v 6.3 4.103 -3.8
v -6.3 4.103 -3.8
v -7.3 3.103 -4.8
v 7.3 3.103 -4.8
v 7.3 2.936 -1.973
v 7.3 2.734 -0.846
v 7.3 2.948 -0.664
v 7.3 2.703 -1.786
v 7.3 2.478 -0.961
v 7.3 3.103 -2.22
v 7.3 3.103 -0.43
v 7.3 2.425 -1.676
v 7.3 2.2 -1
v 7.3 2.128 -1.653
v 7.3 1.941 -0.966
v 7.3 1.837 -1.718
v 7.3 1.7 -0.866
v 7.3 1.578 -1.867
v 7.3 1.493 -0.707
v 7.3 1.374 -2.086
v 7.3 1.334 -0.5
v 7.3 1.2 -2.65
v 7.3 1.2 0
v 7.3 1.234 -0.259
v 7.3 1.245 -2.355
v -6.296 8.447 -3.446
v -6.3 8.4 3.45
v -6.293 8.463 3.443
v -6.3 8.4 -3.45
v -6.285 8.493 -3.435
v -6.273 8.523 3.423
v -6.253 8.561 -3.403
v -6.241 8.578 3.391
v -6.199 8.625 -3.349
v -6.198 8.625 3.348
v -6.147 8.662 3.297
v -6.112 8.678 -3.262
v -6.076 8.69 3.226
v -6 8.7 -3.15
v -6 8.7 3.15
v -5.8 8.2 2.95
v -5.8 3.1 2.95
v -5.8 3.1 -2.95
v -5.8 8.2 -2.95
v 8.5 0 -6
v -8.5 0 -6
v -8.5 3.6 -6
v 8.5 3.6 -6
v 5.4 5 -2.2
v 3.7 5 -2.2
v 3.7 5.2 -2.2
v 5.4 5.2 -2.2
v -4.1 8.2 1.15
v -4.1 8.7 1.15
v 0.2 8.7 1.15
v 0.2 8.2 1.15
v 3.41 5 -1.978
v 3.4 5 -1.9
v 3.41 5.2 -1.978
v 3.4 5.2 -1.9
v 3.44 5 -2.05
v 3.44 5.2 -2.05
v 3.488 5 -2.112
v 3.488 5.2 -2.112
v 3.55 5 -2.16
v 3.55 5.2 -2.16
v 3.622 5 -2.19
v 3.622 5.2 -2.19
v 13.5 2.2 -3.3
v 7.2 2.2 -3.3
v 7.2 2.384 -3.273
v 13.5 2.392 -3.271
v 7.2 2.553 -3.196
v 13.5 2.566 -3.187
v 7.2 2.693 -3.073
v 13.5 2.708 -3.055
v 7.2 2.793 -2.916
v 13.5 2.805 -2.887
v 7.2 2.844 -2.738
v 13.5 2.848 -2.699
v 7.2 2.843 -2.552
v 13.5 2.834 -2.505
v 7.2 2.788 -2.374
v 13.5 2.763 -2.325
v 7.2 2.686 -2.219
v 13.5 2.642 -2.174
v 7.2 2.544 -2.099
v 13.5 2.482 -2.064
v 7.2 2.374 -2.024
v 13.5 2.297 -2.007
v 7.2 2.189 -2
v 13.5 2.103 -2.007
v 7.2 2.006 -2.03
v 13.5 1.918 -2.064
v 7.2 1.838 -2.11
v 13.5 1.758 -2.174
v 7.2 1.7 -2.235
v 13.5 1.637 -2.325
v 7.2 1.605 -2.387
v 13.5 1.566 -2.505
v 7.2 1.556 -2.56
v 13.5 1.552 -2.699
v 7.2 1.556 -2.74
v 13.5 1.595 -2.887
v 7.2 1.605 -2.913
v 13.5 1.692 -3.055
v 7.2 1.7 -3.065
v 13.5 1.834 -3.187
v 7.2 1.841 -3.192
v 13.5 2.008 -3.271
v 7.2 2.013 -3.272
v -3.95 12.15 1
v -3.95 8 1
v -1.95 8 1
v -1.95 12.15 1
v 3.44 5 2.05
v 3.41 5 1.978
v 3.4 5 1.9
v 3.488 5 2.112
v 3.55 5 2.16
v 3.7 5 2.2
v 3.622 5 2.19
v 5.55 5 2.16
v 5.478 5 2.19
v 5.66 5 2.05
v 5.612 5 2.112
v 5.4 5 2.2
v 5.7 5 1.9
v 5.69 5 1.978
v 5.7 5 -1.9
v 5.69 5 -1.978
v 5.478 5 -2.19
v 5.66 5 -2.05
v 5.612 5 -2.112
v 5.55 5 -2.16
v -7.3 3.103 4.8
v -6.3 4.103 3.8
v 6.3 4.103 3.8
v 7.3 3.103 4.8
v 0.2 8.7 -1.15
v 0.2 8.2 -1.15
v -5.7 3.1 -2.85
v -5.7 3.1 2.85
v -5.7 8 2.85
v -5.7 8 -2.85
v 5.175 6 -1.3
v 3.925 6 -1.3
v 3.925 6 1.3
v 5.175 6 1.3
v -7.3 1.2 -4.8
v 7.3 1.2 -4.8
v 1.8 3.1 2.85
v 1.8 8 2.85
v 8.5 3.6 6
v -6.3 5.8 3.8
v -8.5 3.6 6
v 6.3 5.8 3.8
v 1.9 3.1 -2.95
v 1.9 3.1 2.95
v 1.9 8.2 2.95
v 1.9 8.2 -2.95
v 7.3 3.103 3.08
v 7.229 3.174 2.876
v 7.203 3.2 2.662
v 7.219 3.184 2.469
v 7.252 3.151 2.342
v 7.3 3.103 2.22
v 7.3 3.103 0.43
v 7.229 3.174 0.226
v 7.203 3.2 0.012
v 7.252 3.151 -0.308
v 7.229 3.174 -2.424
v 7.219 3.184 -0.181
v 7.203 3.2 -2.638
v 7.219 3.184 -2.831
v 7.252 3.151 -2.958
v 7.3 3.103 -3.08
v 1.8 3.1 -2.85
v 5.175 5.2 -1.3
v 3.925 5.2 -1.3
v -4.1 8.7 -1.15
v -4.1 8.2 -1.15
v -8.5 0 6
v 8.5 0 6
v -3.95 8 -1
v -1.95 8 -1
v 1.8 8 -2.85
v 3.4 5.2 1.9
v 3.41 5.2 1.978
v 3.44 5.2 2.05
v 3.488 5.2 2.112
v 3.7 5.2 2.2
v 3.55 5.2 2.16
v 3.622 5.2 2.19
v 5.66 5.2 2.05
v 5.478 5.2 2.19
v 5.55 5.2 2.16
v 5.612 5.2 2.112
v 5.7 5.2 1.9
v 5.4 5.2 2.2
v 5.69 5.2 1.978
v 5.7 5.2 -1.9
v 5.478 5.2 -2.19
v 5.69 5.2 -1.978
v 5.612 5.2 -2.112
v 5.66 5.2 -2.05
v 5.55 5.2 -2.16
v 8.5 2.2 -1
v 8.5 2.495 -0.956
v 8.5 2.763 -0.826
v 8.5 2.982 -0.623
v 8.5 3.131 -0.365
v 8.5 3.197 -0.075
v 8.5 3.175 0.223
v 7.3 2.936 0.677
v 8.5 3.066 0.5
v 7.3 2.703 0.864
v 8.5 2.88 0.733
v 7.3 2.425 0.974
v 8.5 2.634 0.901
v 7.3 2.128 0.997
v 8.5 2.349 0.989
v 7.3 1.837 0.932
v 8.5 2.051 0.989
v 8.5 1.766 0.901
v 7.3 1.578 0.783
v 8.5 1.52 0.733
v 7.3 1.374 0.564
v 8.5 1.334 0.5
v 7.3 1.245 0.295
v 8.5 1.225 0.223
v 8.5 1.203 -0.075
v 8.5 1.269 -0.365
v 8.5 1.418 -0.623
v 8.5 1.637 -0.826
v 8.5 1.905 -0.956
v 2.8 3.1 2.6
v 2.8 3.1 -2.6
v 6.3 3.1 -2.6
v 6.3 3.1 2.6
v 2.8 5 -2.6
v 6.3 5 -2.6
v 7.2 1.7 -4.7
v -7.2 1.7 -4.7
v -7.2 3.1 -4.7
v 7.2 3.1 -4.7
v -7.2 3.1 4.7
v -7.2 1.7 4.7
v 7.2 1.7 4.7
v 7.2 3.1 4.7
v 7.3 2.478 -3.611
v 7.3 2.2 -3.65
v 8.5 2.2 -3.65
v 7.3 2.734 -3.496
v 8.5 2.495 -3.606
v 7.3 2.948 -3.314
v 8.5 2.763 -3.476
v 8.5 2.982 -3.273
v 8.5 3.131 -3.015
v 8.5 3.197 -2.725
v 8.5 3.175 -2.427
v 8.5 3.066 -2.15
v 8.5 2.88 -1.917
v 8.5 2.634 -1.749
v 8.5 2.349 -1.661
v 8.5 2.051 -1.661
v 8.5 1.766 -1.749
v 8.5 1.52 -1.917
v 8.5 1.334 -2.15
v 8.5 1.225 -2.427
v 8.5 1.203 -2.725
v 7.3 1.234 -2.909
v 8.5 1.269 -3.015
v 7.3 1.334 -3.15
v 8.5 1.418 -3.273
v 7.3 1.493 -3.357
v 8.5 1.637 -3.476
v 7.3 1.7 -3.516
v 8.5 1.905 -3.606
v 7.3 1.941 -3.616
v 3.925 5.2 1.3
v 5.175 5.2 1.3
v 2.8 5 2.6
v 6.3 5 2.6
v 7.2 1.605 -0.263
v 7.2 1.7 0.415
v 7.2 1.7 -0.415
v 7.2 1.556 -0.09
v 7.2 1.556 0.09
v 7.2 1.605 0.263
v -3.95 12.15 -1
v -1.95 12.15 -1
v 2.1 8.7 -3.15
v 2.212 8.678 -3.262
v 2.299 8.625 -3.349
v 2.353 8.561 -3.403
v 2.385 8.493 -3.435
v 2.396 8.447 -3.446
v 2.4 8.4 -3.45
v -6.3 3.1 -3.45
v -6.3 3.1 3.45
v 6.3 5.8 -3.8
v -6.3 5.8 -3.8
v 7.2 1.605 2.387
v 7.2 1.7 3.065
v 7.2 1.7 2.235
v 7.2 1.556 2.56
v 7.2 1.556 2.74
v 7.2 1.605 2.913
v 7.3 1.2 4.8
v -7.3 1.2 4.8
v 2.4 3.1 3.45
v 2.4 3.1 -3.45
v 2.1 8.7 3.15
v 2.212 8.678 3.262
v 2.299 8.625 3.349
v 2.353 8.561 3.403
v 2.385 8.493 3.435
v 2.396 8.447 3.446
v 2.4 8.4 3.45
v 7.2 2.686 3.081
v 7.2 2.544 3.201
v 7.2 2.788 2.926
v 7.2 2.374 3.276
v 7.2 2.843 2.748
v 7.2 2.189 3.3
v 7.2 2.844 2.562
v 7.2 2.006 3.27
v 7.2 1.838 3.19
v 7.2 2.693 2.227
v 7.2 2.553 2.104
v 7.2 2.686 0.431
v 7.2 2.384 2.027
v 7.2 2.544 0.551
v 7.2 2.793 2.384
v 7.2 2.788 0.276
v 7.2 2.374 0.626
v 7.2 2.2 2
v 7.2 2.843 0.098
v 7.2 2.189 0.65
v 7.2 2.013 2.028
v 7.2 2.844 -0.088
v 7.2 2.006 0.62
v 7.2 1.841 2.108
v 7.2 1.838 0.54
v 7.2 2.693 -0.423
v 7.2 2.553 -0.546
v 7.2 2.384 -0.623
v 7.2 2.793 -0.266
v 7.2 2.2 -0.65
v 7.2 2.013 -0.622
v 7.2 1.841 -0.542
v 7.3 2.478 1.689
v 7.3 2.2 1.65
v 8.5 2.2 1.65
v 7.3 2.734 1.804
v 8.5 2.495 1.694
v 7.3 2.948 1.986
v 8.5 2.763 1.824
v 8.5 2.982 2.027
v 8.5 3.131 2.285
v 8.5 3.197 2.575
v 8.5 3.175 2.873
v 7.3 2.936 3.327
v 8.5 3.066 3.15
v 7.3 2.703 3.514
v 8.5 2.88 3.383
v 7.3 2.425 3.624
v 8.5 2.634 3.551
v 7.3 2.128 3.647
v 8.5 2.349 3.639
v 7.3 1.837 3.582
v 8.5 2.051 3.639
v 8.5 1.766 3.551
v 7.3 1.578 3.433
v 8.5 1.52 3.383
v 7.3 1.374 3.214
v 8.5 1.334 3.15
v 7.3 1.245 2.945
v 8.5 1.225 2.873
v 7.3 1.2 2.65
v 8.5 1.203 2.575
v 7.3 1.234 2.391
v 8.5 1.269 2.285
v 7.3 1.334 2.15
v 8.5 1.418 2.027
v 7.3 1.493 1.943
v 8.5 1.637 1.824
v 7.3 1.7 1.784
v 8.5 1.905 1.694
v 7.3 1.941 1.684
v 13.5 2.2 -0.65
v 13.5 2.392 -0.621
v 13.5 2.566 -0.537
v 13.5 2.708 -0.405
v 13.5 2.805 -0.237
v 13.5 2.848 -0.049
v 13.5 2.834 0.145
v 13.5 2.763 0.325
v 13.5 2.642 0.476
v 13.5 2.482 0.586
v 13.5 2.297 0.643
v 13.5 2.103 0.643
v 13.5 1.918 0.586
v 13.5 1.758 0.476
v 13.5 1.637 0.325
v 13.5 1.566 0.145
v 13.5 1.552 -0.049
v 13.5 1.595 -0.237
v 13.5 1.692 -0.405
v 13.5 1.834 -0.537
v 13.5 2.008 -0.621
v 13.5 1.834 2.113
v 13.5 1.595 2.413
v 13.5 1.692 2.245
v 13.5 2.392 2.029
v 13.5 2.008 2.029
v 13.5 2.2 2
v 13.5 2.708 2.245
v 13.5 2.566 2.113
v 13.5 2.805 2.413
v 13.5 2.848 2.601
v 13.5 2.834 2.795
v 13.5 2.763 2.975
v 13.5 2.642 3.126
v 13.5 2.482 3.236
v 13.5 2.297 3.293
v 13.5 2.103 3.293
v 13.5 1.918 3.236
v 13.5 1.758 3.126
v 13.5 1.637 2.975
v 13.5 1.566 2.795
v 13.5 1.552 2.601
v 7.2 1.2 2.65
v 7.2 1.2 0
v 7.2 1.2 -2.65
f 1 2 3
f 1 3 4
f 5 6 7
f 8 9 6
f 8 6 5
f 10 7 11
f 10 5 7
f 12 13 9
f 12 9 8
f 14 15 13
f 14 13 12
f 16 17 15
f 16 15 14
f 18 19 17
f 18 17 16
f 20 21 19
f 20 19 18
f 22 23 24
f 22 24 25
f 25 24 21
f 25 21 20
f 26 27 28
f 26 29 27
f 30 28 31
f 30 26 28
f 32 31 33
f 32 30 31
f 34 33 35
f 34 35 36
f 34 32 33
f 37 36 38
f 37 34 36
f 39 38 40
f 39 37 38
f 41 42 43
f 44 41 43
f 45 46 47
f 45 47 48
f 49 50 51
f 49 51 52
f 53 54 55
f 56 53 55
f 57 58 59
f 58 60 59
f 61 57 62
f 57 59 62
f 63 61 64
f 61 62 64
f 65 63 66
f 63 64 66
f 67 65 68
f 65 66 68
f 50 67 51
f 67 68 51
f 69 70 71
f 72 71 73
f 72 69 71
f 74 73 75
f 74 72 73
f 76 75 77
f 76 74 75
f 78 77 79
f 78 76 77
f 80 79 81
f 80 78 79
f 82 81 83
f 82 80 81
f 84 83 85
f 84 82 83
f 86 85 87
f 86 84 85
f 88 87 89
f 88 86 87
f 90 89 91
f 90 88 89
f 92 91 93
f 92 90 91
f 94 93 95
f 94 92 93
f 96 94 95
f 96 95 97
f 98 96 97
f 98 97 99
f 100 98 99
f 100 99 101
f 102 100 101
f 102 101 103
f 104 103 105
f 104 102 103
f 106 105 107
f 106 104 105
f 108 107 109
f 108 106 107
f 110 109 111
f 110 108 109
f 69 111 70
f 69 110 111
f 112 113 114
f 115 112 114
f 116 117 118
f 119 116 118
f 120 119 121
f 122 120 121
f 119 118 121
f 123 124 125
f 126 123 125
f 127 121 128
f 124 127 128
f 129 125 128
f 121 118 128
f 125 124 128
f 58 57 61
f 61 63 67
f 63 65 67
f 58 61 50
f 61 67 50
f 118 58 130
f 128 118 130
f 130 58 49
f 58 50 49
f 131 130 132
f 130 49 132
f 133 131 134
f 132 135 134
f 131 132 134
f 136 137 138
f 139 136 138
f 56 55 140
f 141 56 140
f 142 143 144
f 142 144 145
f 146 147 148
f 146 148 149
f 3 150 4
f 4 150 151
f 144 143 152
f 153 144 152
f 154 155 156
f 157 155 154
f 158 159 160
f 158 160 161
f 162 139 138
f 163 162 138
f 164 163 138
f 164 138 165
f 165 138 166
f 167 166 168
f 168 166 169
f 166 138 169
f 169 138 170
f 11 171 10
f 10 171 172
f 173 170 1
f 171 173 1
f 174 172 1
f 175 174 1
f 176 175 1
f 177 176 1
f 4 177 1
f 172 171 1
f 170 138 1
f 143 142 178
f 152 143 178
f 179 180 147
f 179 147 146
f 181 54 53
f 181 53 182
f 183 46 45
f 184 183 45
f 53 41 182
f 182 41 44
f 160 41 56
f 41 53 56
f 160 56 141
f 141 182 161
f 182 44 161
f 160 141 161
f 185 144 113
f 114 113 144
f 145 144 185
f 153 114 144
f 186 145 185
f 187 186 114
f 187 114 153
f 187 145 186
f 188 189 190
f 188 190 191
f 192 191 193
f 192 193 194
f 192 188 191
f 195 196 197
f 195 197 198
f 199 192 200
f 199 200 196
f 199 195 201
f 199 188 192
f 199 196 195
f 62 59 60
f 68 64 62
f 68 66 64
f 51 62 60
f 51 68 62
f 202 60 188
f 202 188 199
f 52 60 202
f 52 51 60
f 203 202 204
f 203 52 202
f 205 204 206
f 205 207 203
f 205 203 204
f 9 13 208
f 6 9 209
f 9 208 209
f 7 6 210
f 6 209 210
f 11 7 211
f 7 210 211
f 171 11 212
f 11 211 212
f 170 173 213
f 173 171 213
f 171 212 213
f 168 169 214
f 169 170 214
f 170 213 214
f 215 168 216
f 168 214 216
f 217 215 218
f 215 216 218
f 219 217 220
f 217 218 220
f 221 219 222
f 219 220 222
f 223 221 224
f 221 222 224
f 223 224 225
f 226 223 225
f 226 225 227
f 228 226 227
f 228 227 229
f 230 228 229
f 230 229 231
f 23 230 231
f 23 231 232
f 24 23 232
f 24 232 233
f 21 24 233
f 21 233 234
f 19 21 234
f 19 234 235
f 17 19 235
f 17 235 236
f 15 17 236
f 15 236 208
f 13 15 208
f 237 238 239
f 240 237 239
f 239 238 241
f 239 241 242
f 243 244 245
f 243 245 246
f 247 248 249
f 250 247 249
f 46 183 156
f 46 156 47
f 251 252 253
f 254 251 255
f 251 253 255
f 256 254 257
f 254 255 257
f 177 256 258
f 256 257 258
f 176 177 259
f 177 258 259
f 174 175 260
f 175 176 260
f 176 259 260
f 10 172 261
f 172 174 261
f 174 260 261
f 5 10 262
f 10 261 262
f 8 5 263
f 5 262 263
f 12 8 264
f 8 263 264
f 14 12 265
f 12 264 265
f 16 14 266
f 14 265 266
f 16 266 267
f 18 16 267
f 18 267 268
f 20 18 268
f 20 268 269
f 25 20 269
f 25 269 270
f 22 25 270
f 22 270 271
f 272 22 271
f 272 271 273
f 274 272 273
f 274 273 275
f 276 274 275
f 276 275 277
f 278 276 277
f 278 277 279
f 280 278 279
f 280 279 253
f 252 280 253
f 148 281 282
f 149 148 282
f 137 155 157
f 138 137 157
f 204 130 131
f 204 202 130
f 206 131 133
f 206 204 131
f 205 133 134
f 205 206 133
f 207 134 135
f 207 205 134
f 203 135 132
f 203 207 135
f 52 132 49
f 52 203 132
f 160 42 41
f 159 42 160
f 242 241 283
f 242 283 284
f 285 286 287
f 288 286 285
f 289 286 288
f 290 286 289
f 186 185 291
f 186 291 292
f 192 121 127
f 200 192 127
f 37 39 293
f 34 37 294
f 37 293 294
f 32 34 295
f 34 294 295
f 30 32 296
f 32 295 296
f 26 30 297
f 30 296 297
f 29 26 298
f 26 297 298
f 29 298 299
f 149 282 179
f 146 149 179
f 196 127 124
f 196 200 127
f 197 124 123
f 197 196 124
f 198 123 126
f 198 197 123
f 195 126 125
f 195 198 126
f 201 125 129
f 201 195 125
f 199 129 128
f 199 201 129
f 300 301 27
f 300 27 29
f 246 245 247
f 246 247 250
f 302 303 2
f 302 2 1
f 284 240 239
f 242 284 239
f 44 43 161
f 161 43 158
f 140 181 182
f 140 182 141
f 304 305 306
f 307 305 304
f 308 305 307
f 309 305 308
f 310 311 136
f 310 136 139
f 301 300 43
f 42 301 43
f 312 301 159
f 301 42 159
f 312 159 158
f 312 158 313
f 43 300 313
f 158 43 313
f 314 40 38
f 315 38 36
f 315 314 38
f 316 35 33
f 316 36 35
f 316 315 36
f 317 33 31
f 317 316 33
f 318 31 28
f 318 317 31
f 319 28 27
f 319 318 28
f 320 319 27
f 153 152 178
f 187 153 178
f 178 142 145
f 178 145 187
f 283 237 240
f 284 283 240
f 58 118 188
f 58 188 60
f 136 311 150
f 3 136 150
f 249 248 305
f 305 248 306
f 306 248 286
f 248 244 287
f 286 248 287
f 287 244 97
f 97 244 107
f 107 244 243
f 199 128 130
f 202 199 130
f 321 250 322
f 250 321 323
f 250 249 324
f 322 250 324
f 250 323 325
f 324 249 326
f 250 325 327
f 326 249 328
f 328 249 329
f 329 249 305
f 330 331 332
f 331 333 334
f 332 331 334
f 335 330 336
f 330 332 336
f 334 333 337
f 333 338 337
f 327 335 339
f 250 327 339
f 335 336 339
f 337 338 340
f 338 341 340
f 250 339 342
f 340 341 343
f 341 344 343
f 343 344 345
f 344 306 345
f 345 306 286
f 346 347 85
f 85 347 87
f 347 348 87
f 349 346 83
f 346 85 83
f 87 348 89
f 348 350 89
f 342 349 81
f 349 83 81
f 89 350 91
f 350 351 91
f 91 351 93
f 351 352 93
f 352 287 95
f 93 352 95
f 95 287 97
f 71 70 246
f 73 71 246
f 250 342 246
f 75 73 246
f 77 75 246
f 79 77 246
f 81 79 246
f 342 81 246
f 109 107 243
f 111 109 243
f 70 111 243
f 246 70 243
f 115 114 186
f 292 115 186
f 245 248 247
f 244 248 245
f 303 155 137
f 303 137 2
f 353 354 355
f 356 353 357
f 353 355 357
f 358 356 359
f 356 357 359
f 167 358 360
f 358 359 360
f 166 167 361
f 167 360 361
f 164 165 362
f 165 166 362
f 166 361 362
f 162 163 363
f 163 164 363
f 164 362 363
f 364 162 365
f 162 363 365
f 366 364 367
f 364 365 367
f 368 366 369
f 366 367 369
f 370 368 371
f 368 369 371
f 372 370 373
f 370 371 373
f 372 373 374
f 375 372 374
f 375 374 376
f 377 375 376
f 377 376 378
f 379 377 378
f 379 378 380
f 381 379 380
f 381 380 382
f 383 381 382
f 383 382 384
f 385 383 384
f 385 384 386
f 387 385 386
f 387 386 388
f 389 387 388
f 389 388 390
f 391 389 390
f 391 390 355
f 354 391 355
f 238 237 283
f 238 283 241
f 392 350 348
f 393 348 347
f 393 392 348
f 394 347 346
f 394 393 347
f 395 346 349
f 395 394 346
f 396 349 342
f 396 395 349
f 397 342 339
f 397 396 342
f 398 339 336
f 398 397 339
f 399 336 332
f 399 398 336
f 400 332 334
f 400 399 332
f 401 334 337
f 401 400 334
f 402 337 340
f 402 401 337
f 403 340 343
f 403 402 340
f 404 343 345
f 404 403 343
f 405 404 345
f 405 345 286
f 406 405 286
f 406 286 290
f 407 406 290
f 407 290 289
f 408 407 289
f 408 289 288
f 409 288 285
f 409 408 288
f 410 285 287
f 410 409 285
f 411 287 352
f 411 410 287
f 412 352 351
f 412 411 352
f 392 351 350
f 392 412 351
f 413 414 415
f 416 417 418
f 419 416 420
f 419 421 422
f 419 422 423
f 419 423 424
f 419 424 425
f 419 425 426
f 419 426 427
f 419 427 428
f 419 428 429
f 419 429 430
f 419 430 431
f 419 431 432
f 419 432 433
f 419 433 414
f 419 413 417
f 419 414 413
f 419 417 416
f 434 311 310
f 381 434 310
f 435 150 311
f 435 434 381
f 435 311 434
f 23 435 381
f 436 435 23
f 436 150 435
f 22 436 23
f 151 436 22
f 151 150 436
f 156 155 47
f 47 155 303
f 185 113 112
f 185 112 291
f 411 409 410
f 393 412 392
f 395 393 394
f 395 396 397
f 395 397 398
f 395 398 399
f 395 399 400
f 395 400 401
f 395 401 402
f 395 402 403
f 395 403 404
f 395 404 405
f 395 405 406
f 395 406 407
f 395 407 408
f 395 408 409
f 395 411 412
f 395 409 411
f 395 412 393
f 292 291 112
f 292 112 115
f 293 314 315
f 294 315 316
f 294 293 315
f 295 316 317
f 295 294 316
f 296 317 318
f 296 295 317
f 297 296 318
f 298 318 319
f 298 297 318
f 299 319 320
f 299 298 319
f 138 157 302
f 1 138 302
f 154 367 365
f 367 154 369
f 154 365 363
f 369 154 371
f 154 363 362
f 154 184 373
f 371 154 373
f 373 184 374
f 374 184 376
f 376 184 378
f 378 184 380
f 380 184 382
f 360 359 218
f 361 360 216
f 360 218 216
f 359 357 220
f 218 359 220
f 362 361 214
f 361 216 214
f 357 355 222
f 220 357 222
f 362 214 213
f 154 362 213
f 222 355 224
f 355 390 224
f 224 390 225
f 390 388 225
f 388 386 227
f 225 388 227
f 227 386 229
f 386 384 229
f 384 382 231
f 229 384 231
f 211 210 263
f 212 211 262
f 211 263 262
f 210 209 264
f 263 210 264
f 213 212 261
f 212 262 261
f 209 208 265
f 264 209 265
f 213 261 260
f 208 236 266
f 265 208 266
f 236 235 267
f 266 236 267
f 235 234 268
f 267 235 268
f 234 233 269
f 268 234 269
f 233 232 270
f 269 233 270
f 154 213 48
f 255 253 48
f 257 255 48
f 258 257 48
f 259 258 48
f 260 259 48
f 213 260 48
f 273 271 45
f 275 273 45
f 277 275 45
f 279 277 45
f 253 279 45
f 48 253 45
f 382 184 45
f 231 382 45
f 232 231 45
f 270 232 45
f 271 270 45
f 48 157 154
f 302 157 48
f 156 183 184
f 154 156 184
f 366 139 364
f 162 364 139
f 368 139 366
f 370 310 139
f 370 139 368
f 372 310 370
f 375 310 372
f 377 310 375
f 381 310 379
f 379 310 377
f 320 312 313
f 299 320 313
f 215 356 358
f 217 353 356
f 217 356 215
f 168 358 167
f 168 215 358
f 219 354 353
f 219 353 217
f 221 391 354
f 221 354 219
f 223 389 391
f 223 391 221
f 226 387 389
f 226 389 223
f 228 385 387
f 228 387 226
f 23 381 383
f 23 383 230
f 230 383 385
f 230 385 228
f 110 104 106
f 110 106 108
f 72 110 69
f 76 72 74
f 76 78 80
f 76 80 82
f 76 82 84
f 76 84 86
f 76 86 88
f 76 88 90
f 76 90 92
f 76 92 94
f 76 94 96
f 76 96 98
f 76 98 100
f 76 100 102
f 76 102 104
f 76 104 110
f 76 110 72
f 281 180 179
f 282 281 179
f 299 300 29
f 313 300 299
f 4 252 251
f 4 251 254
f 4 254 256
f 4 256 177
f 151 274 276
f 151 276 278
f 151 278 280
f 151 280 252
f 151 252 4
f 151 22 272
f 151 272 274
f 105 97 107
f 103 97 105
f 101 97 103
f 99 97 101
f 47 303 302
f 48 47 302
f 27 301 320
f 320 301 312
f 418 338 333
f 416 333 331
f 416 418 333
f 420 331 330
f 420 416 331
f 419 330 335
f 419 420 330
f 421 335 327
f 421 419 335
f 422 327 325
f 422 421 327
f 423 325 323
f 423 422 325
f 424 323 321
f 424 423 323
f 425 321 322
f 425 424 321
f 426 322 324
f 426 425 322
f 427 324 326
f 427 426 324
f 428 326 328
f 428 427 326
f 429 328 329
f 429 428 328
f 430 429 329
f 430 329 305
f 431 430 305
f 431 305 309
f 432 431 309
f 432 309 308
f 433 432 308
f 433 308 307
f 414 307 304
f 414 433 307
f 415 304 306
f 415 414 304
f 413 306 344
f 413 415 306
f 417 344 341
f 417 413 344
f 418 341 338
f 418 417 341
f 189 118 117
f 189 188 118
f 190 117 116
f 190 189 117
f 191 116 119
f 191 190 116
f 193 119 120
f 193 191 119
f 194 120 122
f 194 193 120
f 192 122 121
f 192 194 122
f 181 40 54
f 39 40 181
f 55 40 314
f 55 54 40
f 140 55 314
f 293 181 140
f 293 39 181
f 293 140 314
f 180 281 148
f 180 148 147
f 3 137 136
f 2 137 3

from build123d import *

# Parameters (mm, degrees)
SKIZZE1_W                            = 17
SKIZZE1_H                            = 12
AUFSATZ_LINEAR_AUSTRAGEN1_DEPTH      = 5.8
FASE1_SIZE                           = 2.2
WANDUNG1_T                           = -1.2
SCHNITT_LINEAR_AUSTRAGEN1_REACH      = 7.8
SKIZZE2_W                            = 12.6
SKIZZE2_H                            = 7.6
AUFSATZ_LINEAR_START                 = 0.5
SKIZZE3_W                            = 14.4
SKIZZE3_H                            = 9.4
AUFSATZ_LINEAR_AUSTRAGEN2_DEPTH      = 1.4
SKIZZE4_R                            = 1
SCHNITT_LINEAR_AUSTRAGEN2_DEPTH      = 1.3
SKIZZE4_3_R                          = 0.65
AUFSATZ_LINEAR_AUSTRAGEN3_DEPTH      = 5
AUFSATZ_LINEAR_AUSTRAGEN3_DEPTH_BACK = 1.3
SKIZZE5_W                            = 8.7
SKIZZE5_H                            = 6.9
SKIZZE5_W_2                          = 7.7
SKIZZE5_H_2                          = 5.9
LINEAR_AUSTRAGEN_D_NN1_DEPTH         = 5.6
AUFSATZ_LINEAR_START_2               = 5.6
SKIZZE5_3_W                          = 8.7
SKIZZE5_3_H                          = 6.9
SKIZZE5_3_W_2                        = 4.3
SKIZZE5_3_H_2                        = 2.3
SKIZZE5_3_W_3                        = 7.5
SKIZZE5_3_H_3                        = 5.7
AUFSATZ_LINEAR_AUSTRAGEN6_DEPTH      = 0.5
SKIZZE5_4_W                          = 3.5
SKIZZE5_4_H                          = 5.2
AUFSATZ_LINEAR_AUSTRAGEN7_DEPTH      = 1.9
AUFSATZ_LINEAR_START_3               = 1.9
SKIZZE5_5_W                          = 2.3
SKIZZE5_5_H                          = 4.4
AUFSATZ_LINEAR_AUSTRAGEN8_DEPTH      = 0.2
AUFSATZ_LINEAR_START_4               = 2.1
SKIZZE5_7_W                          = 1.25
SKIZZE5_7_H                          = 2.6
AUFSATZ_LINEAR_AUSTRAGEN9_DEPTH      = 0.8
SKIZZE5_9_W                          = 7.5
SKIZZE5_9_H                          = 5.7
AUFSATZ_LINEAR_AUSTRAGEN10_DEPTH     = 4.9
AUFSATZ_LINEAR_START_5               = 4.9
SKIZZE5_10_W                         = 2
SKIZZE5_10_H                         = 2
AUFSATZ_LINEAR_AUSTRAGEN11_DEPTH     = 4.15
VERRUNDUNG1_R                        = 0.3
VERRUNDUNG2_R                        = 0.3


with BuildPart() as part:
    # Skizze1 → Aufsatz-Linear austragen1 (new body)
    with BuildSketch(Plane(origin=(0, 0, 0), x_dir=(1, 0, 0), z_dir=(0, 1, 0))):
        Rectangle(SKIZZE1_W, SKIZZE1_H)
    extrude(amount=AUFSATZ_LINEAR_AUSTRAGEN1_DEPTH)

    # Fase1
    fase1_edges = [part.edges().sort_by_distance(p)[0] for p in [
        (8.5, 5.8, 0),
        (0, 5.8, -6),
        (-8.5, 5.8, 0),
        (0, 5.8, 6),
    ]]
    chamfer(fase1_edges, length=FASE1_SIZE)

    # Wandung1
    wandung1_openings = [part.faces().sort_by_distance(p)[0] for p in [
        (0, 5.8, 0),
    ]]
    offset(amount=WANDUNG1_T, openings=wandung1_openings, kind=Kind.INTERSECTION)

    # Skizze2 → Schnitt-Linear austragen1 (cut, up to next)
    with BuildSketch(Plane(origin=(0, 5.8, 0), x_dir=(1, 0, 0), z_dir=(0, 1, 0)), mode=Mode.PRIVATE) as schnitt_linear_austragen1_sk1:
        Rectangle(SKIZZE2_W, SKIZZE2_H)
    schnitt_linear_austragen1_tool1 = extrude(schnitt_linear_austragen1_sk1.sketch, amount=-SCHNITT_LINEAR_AUSTRAGEN1_REACH, mode=Mode.PRIVATE) & part.part
    add(schnitt_linear_austragen1_tool1.solids().sort_by_distance((0, 5.8, 0))[0], mode=Mode.SUBTRACT)

    # Skizze4 → Schnitt-Linear austragen2 (cut)
    with BuildSketch(Plane(origin=(8.5, 0, 0), x_dir=(0, 0, -1), z_dir=(1, 0, 0))):
        with Locations((-2.65, 2.2)):
            Circle(SKIZZE4_R)
        with Locations((0, 2.2)):
            Circle(SKIZZE4_R)
        with Locations((2.65, 2.2)):
            Circle(SKIZZE4_R)
    extrude(amount=-SCHNITT_LINEAR_AUSTRAGEN2_DEPTH, mode=Mode.SUBTRACT)


with BuildPart() as body_2:
    # Skizze3 → Aufsatz-Linear austragen2 (new body)
    with BuildSketch(Plane(origin=(0, 1.2, 0), x_dir=(1, 0, 0), z_dir=(0, 1, 0)).offset(AUFSATZ_LINEAR_START)):
        Rectangle(SKIZZE3_W, SKIZZE3_H)
    extrude(amount=AUFSATZ_LINEAR_AUSTRAGEN2_DEPTH)

    # Skizze4<3> → Aufsatz-Linear austragen3 (add, two sides)
    with BuildSketch(Plane(origin=(8.5, 0, 0), x_dir=(0, 0, -1), z_dir=(1, 0, 0))) as aufsatz_linear_austragen3_sk:
        with Locations((-2.65, 2.2)):
            Circle(SKIZZE4_3_R)
        with Locations((0, 2.2)):
            Circle(SKIZZE4_3_R)
        with Locations((2.65, 2.2)):
            Circle(SKIZZE4_3_R)
    extrude(amount=AUFSATZ_LINEAR_AUSTRAGEN3_DEPTH)
    extrude(aufsatz_linear_austragen3_sk.sketch, amount=-AUFSATZ_LINEAR_AUSTRAGEN3_DEPTH_BACK)


with BuildPart() as body_3:
    # Skizze5 → Linear-Austragen-Dünn1 (new body)
    with BuildSketch(Plane(origin=(0, 3.1, 0), x_dir=(1, 0, 0), z_dir=(0, 1, 0))):
        with Locations((-1.95, 0)):
            Rectangle(SKIZZE5_W, SKIZZE5_H)
        with Locations((-1.95, 0)):
            Rectangle(SKIZZE5_W_2, SKIZZE5_H_2, mode=Mode.SUBTRACT)
    extrude(amount=LINEAR_AUSTRAGEN_D_NN1_DEPTH)

    # Skizze5<3> → Aufsatz-Linear austragen6 (add)
    with BuildSketch(Plane(origin=(0, 3.1, 0), x_dir=(1, 0, 0), z_dir=(0, 1, 0)).offset(AUFSATZ_LINEAR_START_2)):
        with Locations((-1.95, 0)):
            Rectangle(SKIZZE5_3_W, SKIZZE5_3_H)
        with Locations((-1.95, 0)):
            Rectangle(SKIZZE5_3_W_2, SKIZZE5_3_H_2, mode=Mode.SUBTRACT)
        with Locations((-1.95, 0)):
            Rectangle(SKIZZE5_3_W_3, SKIZZE5_3_H_3)
        with Locations((-1.95, 0)):
            Rectangle(SKIZZE5_3_W_2, SKIZZE5_3_H_2, mode=Mode.SUBTRACT)
    extrude(amount=-AUFSATZ_LINEAR_AUSTRAGEN6_DEPTH)

    # Verrundung1
    verrundung1_edges = [body_3.edges().sort_by_distance(p)[0] for p in [
        (2.4, 8.7, 0),
        (-1.95, 8.7, -3.45),
        (-6.3, 8.7, 0),
        (-1.95, 8.7, 3.45),
    ]]
    fillet(verrundung1_edges, radius=VERRUNDUNG1_R)


with BuildPart() as body_4:
    # Skizze5<4> → Aufsatz-Linear austragen7 (new body)
    with BuildSketch(Plane(origin=(0, 3.1, 0), x_dir=(1, 0, 0), z_dir=(0, 1, 0))):
        with Locations((4.55, 0)):
            Rectangle(SKIZZE5_4_W, SKIZZE5_4_H)
    extrude(amount=AUFSATZ_LINEAR_AUSTRAGEN7_DEPTH)


with BuildPart() as body_5:
    # Skizze5<5> → Aufsatz-Linear austragen8 (new body)
    with BuildSketch(Plane(origin=(0, 3.1, 0), x_dir=(1, 0, 0), z_dir=(0, 1, 0)).offset(AUFSATZ_LINEAR_START_3)):
        with Locations((4.55, 0)):
            Rectangle(SKIZZE5_5_W, SKIZZE5_5_H)
    extrude(amount=AUFSATZ_LINEAR_AUSTRAGEN8_DEPTH)

    # Verrundung2
    verrundung2_edges = [body_5.edges().sort_by_distance(p)[0] for p in [
        (3.4, 5.1, 2.2),
        (3.4, 5.1, -2.2),
        (5.7, 5.1, -2.2),
        (5.7, 5.1, 2.2),
    ]]
    fillet(verrundung2_edges, radius=VERRUNDUNG2_R)


with BuildPart() as body_6:
    # Skizze5<7> → Aufsatz-Linear austragen9 (new body)
    with BuildSketch(Plane(origin=(0, 3.1, 0), x_dir=(1, 0, 0), z_dir=(0, 1, 0)).offset(AUFSATZ_LINEAR_START_4)):
        with Locations((4.55, 0)):
            Rectangle(SKIZZE5_7_W, SKIZZE5_7_H)
    extrude(amount=AUFSATZ_LINEAR_AUSTRAGEN9_DEPTH)


with BuildPart() as body_7:
    # Skizze5<9> → Aufsatz-Linear austragen10 (new body)
    with BuildSketch(Plane(origin=(0, 3.1, 0), x_dir=(1, 0, 0), z_dir=(0, 1, 0))):
        with Locations((-1.95, 0)):
            Rectangle(SKIZZE5_9_W, SKIZZE5_9_H)
    extrude(amount=AUFSATZ_LINEAR_AUSTRAGEN10_DEPTH)

    # Skizze5<10> → Aufsatz-Linear austragen11 (add)
    with BuildSketch(Plane(origin=(0, 3.1, 0), x_dir=(1, 0, 0), z_dir=(0, 1, 0)).offset(AUFSATZ_LINEAR_START_5)):
        with Locations((-2.95, 0)):
            Rectangle(SKIZZE5_10_W, SKIZZE5_10_H)
    extrude(amount=AUFSATZ_LINEAR_AUSTRAGEN11_DEPTH)


solid = Compound([part.part, body_2.part, body_3.part, body_4.part, body_5.part, body_6.part, body_7.part])
